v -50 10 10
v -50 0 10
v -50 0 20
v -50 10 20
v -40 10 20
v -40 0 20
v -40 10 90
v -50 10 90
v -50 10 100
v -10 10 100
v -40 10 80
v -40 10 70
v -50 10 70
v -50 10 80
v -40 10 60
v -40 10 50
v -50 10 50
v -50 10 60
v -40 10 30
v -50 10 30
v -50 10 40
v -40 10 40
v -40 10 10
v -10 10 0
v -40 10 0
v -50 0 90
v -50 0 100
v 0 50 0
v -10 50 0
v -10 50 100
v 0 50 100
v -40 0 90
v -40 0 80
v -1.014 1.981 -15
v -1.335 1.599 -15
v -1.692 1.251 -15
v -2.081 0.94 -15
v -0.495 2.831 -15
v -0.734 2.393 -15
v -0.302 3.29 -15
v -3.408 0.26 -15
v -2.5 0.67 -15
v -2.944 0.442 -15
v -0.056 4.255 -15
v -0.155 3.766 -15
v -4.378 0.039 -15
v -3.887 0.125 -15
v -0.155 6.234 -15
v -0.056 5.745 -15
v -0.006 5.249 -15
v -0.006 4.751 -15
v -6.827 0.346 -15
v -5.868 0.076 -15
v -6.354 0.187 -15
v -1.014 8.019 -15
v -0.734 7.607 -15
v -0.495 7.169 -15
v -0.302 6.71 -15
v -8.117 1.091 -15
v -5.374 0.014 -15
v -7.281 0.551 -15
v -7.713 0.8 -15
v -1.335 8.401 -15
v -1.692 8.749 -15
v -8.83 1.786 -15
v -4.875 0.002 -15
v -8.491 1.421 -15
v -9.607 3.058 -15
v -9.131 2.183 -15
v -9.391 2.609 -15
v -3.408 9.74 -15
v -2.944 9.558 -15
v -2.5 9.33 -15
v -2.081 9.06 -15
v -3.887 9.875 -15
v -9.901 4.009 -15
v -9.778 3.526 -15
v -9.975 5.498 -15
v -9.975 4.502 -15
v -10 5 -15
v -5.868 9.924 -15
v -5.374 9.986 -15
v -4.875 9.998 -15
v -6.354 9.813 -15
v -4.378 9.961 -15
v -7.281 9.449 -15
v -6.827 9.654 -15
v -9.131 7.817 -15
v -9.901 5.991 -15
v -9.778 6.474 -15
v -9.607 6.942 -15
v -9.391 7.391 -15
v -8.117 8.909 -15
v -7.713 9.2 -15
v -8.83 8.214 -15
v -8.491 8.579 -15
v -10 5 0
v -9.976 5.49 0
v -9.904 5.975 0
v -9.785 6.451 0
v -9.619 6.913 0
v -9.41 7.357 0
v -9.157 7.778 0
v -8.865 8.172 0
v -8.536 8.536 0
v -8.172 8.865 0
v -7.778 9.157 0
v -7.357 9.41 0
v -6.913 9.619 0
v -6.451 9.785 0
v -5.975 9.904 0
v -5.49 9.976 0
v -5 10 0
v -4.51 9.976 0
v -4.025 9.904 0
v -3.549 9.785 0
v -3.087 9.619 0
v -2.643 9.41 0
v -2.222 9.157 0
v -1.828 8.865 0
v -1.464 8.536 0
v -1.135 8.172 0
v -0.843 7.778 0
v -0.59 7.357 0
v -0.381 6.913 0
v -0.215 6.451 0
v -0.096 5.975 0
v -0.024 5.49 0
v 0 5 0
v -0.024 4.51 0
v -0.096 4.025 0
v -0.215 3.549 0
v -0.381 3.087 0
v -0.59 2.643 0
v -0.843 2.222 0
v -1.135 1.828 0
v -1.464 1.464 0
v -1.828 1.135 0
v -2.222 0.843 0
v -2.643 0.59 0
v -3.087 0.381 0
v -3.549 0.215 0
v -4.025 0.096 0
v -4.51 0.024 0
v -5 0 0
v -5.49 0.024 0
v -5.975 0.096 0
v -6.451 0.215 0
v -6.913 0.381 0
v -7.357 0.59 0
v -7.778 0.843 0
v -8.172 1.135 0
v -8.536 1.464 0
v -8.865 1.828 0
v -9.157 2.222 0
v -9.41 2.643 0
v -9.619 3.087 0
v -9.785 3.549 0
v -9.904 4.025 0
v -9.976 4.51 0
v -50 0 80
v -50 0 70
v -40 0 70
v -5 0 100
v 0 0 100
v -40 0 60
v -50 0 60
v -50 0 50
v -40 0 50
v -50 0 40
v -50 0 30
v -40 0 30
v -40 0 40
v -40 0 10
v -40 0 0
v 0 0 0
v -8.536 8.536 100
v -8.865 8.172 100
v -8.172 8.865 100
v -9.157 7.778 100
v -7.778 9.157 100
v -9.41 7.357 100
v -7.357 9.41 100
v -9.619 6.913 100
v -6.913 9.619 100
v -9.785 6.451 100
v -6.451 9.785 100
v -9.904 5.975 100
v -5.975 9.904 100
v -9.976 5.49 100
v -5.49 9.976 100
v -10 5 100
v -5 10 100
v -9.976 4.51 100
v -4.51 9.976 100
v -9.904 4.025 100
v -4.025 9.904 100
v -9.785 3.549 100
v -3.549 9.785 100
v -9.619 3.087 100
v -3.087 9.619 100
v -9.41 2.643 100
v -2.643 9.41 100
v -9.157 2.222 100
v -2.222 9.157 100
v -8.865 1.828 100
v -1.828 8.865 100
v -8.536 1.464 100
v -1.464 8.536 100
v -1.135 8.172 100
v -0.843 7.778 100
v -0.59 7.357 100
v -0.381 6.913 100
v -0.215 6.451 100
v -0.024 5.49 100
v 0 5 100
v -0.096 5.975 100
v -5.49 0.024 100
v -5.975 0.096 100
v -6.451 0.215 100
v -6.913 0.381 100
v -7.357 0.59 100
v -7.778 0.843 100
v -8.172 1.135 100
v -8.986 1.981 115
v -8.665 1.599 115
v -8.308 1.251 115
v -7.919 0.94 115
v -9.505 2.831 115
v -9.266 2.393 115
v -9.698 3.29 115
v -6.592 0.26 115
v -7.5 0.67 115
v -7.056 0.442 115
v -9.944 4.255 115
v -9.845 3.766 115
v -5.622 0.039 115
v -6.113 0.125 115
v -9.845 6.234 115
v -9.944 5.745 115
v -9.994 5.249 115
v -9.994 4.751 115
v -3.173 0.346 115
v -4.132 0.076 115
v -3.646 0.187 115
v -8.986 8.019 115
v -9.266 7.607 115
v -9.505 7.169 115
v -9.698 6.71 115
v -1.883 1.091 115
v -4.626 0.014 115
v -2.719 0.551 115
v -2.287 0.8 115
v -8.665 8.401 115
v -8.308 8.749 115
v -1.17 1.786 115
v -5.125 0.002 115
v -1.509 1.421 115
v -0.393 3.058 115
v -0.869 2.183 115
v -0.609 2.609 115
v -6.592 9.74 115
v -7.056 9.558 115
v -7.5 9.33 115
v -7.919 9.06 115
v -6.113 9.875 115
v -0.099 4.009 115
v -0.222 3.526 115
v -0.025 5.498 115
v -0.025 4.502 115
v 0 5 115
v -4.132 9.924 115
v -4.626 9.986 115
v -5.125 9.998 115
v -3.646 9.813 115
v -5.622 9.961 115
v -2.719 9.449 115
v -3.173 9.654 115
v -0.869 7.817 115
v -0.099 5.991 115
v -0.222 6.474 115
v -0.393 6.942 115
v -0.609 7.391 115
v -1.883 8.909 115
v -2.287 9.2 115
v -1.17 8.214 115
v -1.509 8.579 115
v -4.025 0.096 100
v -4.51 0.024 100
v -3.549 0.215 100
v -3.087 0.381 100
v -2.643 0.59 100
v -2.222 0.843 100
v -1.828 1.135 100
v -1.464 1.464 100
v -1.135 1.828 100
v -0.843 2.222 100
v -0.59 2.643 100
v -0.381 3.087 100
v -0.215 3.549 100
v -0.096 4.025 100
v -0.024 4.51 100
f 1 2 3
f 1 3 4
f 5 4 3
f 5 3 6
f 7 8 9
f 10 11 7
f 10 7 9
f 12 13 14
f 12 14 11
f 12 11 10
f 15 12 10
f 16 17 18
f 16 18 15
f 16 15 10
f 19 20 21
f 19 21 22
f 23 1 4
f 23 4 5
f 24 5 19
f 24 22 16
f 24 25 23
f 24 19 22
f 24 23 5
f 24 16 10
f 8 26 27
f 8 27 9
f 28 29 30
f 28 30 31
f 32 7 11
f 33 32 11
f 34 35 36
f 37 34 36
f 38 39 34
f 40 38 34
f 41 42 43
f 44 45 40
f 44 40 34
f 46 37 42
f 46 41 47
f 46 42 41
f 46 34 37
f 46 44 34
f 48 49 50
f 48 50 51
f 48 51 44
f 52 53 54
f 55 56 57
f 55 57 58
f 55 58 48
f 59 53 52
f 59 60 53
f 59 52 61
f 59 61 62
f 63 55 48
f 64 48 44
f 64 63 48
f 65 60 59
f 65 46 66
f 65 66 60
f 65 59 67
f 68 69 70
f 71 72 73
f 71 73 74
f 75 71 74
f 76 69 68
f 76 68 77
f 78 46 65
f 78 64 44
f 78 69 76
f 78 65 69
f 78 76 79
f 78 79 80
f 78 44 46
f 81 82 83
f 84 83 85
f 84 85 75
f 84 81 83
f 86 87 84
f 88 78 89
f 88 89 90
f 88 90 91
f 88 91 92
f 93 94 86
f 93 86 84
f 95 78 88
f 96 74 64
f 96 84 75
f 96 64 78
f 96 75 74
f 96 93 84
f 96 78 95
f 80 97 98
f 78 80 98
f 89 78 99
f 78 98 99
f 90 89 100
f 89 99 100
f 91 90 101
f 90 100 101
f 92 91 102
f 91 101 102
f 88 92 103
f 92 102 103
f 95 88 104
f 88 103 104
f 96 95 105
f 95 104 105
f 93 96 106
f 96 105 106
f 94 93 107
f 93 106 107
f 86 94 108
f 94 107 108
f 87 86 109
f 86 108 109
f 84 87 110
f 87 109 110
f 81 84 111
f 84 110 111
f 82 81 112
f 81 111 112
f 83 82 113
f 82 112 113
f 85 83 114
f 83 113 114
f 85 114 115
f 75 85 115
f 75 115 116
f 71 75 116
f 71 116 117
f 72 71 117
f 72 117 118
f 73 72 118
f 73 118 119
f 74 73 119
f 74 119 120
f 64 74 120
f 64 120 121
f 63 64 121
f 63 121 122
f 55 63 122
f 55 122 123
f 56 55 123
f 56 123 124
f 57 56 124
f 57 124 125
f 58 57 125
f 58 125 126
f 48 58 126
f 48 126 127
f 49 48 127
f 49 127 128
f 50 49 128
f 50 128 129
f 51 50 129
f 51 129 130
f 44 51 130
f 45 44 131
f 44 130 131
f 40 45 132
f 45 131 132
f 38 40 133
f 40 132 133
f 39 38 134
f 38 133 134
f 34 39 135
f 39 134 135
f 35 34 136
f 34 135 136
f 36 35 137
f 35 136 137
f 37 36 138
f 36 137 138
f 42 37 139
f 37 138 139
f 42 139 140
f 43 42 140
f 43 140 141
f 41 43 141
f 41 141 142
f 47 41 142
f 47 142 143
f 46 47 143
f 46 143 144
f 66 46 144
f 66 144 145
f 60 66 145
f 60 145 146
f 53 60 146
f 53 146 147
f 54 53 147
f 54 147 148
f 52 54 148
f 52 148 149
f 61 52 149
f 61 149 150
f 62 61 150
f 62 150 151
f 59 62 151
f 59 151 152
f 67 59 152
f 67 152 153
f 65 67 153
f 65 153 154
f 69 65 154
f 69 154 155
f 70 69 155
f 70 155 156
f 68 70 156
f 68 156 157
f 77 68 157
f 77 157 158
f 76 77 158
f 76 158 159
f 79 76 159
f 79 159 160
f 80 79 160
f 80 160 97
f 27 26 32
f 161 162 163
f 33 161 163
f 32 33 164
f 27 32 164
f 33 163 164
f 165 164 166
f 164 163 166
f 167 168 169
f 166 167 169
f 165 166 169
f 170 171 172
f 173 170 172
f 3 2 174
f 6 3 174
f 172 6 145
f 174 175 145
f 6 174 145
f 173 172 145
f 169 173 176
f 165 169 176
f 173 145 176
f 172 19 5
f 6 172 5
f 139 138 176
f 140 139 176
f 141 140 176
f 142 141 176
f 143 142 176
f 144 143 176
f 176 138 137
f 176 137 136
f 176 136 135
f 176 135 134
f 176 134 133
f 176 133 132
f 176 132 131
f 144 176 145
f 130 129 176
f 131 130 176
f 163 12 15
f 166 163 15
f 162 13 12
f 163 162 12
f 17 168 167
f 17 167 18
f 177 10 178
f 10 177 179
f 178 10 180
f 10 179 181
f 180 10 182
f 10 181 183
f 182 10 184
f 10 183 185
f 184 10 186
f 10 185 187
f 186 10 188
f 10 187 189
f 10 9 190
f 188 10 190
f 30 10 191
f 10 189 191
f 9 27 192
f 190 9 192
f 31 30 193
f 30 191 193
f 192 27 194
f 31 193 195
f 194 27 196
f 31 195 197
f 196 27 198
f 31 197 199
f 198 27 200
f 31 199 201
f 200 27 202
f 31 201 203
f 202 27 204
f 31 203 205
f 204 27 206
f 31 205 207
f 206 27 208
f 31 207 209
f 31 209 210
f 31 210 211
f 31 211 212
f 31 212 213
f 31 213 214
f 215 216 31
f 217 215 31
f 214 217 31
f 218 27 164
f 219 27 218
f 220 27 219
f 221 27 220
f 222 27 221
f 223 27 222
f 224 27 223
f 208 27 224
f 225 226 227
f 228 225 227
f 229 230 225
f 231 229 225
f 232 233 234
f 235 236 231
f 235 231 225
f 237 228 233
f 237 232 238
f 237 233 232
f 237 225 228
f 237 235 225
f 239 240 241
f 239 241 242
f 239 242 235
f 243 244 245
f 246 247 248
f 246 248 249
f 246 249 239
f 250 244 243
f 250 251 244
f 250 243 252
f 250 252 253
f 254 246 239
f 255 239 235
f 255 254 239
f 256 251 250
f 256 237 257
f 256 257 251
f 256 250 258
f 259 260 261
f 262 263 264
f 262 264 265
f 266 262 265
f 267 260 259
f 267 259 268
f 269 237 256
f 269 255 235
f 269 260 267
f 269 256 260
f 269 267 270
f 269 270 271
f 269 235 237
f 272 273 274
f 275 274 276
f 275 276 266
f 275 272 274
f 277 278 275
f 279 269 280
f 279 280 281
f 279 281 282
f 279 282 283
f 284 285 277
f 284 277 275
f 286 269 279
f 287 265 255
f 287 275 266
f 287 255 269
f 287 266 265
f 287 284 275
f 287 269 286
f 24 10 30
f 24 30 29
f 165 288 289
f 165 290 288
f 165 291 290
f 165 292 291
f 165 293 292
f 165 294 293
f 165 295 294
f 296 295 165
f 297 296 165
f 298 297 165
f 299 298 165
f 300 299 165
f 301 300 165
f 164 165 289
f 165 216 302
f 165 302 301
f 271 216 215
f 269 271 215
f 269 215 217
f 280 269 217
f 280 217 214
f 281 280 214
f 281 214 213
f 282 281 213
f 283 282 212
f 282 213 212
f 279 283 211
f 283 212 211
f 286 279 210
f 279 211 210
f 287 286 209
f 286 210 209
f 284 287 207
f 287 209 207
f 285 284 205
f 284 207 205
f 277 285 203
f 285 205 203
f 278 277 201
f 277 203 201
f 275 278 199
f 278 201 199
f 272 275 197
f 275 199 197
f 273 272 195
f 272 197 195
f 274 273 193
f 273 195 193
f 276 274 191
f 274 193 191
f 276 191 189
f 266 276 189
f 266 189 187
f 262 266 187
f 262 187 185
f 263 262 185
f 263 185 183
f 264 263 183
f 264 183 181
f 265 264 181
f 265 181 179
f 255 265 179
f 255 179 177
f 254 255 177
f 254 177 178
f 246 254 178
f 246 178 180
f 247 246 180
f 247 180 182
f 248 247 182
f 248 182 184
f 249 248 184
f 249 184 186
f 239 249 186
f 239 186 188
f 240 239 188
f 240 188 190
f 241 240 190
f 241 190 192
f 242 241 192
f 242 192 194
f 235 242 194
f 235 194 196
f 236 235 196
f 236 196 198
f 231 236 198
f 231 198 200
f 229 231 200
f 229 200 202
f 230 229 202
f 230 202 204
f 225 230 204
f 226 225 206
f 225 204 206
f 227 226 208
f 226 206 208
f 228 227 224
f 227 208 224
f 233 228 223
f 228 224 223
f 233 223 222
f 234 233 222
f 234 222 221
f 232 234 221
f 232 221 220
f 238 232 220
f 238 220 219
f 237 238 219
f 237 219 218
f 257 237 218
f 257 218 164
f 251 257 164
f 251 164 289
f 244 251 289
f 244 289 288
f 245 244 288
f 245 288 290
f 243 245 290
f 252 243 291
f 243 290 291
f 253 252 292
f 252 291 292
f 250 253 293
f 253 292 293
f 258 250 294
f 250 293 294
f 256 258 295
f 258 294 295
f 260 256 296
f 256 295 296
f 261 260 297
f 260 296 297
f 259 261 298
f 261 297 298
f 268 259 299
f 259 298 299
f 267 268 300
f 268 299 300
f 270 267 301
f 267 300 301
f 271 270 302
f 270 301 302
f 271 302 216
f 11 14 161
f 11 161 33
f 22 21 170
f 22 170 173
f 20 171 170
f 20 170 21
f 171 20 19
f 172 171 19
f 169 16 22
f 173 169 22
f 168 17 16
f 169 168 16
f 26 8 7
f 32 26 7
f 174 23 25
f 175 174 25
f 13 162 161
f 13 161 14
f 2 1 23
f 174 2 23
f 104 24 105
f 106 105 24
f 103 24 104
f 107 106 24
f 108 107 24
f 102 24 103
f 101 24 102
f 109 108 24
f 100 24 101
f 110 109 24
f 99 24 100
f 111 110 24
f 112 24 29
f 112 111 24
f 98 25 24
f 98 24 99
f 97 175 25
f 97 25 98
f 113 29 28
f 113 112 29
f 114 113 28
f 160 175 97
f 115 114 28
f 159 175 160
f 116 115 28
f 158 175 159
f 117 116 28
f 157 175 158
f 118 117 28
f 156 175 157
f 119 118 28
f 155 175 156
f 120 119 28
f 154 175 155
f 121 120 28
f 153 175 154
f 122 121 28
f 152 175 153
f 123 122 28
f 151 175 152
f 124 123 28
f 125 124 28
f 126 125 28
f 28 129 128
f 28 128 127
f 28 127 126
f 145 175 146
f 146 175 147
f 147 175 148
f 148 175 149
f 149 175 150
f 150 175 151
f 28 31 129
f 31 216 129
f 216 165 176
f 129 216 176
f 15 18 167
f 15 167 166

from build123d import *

# Parameters (mm, degrees)
ESQUISSE1_W                = 50
ESQUISSE1_H                = 10
BOSS_EXTRU_1_DEPTH         = 100
ESQUISSE2_R                = 5
BOSS_EXTRU_2_DEPTH         = 15
ESQUISSE3_R                = 5
BOSS_EXTRU_3_DEPTH         = 15
ESQUISSE4_W                = 10
ESQUISSE4_H                = 10
ENL_V_MAT_EXTRU_1_DEPTH    = 15
R_P_TITION_LIN_AIRE1_COUNT = 5
R_P_TITION_LIN_AIRE1_PITCH = 20
ESQUISSE5_W                = 10
ESQUISSE5_H                = 100
BOSS_EXTRU_4_DEPTH         = 40


with BuildPart() as part:
    # Esquisse1 → Boss.-Extru.1 (new body)
    with BuildSketch(Plane.XY):
        with Locations((-25, 5)):
            Rectangle(ESQUISSE1_W, ESQUISSE1_H)
    extrude(amount=BOSS_EXTRU_1_DEPTH)

    # Esquisse2 → Boss.-Extru.2 (add)
    with BuildSketch(Plane.XY.offset(100)):
        with Locations((-5, 5)):
            Circle(ESQUISSE2_R)
    extrude(amount=BOSS_EXTRU_2_DEPTH)

    # Esquisse3 → Boss.-Extru.3 (add)
    with BuildSketch(Plane(origin=(0, 0, 0), x_dir=(-1, 0, 0), z_dir=(0, 0, -1))):
        with Locations((5, 5)):
            Circle(ESQUISSE3_R)
    extrude(amount=BOSS_EXTRU_3_DEPTH)

    # Esquisse4 → Enlèv. mat.-Extru.1 (cut)
    with BuildSketch(Plane(origin=(0, 10, 0), x_dir=(1, 0, 0), z_dir=(0, 1, 0))):
        with Locations((-45, -5)):
            Rectangle(ESQUISSE4_W, ESQUISSE4_H)
    enl_v_mat_extru_1 = extrude(amount=-ENL_V_MAT_EXTRU_1_DEPTH, mode=Mode.SUBTRACT)

    # Répétition linéaire1: Enlèv. mat.-Extru.1 ×5
    with Locations(*[(0, 0, i * R_P_TITION_LIN_AIRE1_PITCH) for i in range(1, R_P_TITION_LIN_AIRE1_COUNT)]):
        add(enl_v_mat_extru_1, mode=Mode.SUBTRACT)

    # Esquisse5 → Boss.-Extru.4 (add)
    with BuildSketch(Plane(origin=(0, 10, 0), x_dir=(1, 0, 0), z_dir=(0, 1, 0))):
        with Locations((-5, -50)):
            Rectangle(ESQUISSE5_W, ESQUISSE5_H)
    extrude(amount=BOSS_EXTRU_4_DEPTH)


solid = part.part
